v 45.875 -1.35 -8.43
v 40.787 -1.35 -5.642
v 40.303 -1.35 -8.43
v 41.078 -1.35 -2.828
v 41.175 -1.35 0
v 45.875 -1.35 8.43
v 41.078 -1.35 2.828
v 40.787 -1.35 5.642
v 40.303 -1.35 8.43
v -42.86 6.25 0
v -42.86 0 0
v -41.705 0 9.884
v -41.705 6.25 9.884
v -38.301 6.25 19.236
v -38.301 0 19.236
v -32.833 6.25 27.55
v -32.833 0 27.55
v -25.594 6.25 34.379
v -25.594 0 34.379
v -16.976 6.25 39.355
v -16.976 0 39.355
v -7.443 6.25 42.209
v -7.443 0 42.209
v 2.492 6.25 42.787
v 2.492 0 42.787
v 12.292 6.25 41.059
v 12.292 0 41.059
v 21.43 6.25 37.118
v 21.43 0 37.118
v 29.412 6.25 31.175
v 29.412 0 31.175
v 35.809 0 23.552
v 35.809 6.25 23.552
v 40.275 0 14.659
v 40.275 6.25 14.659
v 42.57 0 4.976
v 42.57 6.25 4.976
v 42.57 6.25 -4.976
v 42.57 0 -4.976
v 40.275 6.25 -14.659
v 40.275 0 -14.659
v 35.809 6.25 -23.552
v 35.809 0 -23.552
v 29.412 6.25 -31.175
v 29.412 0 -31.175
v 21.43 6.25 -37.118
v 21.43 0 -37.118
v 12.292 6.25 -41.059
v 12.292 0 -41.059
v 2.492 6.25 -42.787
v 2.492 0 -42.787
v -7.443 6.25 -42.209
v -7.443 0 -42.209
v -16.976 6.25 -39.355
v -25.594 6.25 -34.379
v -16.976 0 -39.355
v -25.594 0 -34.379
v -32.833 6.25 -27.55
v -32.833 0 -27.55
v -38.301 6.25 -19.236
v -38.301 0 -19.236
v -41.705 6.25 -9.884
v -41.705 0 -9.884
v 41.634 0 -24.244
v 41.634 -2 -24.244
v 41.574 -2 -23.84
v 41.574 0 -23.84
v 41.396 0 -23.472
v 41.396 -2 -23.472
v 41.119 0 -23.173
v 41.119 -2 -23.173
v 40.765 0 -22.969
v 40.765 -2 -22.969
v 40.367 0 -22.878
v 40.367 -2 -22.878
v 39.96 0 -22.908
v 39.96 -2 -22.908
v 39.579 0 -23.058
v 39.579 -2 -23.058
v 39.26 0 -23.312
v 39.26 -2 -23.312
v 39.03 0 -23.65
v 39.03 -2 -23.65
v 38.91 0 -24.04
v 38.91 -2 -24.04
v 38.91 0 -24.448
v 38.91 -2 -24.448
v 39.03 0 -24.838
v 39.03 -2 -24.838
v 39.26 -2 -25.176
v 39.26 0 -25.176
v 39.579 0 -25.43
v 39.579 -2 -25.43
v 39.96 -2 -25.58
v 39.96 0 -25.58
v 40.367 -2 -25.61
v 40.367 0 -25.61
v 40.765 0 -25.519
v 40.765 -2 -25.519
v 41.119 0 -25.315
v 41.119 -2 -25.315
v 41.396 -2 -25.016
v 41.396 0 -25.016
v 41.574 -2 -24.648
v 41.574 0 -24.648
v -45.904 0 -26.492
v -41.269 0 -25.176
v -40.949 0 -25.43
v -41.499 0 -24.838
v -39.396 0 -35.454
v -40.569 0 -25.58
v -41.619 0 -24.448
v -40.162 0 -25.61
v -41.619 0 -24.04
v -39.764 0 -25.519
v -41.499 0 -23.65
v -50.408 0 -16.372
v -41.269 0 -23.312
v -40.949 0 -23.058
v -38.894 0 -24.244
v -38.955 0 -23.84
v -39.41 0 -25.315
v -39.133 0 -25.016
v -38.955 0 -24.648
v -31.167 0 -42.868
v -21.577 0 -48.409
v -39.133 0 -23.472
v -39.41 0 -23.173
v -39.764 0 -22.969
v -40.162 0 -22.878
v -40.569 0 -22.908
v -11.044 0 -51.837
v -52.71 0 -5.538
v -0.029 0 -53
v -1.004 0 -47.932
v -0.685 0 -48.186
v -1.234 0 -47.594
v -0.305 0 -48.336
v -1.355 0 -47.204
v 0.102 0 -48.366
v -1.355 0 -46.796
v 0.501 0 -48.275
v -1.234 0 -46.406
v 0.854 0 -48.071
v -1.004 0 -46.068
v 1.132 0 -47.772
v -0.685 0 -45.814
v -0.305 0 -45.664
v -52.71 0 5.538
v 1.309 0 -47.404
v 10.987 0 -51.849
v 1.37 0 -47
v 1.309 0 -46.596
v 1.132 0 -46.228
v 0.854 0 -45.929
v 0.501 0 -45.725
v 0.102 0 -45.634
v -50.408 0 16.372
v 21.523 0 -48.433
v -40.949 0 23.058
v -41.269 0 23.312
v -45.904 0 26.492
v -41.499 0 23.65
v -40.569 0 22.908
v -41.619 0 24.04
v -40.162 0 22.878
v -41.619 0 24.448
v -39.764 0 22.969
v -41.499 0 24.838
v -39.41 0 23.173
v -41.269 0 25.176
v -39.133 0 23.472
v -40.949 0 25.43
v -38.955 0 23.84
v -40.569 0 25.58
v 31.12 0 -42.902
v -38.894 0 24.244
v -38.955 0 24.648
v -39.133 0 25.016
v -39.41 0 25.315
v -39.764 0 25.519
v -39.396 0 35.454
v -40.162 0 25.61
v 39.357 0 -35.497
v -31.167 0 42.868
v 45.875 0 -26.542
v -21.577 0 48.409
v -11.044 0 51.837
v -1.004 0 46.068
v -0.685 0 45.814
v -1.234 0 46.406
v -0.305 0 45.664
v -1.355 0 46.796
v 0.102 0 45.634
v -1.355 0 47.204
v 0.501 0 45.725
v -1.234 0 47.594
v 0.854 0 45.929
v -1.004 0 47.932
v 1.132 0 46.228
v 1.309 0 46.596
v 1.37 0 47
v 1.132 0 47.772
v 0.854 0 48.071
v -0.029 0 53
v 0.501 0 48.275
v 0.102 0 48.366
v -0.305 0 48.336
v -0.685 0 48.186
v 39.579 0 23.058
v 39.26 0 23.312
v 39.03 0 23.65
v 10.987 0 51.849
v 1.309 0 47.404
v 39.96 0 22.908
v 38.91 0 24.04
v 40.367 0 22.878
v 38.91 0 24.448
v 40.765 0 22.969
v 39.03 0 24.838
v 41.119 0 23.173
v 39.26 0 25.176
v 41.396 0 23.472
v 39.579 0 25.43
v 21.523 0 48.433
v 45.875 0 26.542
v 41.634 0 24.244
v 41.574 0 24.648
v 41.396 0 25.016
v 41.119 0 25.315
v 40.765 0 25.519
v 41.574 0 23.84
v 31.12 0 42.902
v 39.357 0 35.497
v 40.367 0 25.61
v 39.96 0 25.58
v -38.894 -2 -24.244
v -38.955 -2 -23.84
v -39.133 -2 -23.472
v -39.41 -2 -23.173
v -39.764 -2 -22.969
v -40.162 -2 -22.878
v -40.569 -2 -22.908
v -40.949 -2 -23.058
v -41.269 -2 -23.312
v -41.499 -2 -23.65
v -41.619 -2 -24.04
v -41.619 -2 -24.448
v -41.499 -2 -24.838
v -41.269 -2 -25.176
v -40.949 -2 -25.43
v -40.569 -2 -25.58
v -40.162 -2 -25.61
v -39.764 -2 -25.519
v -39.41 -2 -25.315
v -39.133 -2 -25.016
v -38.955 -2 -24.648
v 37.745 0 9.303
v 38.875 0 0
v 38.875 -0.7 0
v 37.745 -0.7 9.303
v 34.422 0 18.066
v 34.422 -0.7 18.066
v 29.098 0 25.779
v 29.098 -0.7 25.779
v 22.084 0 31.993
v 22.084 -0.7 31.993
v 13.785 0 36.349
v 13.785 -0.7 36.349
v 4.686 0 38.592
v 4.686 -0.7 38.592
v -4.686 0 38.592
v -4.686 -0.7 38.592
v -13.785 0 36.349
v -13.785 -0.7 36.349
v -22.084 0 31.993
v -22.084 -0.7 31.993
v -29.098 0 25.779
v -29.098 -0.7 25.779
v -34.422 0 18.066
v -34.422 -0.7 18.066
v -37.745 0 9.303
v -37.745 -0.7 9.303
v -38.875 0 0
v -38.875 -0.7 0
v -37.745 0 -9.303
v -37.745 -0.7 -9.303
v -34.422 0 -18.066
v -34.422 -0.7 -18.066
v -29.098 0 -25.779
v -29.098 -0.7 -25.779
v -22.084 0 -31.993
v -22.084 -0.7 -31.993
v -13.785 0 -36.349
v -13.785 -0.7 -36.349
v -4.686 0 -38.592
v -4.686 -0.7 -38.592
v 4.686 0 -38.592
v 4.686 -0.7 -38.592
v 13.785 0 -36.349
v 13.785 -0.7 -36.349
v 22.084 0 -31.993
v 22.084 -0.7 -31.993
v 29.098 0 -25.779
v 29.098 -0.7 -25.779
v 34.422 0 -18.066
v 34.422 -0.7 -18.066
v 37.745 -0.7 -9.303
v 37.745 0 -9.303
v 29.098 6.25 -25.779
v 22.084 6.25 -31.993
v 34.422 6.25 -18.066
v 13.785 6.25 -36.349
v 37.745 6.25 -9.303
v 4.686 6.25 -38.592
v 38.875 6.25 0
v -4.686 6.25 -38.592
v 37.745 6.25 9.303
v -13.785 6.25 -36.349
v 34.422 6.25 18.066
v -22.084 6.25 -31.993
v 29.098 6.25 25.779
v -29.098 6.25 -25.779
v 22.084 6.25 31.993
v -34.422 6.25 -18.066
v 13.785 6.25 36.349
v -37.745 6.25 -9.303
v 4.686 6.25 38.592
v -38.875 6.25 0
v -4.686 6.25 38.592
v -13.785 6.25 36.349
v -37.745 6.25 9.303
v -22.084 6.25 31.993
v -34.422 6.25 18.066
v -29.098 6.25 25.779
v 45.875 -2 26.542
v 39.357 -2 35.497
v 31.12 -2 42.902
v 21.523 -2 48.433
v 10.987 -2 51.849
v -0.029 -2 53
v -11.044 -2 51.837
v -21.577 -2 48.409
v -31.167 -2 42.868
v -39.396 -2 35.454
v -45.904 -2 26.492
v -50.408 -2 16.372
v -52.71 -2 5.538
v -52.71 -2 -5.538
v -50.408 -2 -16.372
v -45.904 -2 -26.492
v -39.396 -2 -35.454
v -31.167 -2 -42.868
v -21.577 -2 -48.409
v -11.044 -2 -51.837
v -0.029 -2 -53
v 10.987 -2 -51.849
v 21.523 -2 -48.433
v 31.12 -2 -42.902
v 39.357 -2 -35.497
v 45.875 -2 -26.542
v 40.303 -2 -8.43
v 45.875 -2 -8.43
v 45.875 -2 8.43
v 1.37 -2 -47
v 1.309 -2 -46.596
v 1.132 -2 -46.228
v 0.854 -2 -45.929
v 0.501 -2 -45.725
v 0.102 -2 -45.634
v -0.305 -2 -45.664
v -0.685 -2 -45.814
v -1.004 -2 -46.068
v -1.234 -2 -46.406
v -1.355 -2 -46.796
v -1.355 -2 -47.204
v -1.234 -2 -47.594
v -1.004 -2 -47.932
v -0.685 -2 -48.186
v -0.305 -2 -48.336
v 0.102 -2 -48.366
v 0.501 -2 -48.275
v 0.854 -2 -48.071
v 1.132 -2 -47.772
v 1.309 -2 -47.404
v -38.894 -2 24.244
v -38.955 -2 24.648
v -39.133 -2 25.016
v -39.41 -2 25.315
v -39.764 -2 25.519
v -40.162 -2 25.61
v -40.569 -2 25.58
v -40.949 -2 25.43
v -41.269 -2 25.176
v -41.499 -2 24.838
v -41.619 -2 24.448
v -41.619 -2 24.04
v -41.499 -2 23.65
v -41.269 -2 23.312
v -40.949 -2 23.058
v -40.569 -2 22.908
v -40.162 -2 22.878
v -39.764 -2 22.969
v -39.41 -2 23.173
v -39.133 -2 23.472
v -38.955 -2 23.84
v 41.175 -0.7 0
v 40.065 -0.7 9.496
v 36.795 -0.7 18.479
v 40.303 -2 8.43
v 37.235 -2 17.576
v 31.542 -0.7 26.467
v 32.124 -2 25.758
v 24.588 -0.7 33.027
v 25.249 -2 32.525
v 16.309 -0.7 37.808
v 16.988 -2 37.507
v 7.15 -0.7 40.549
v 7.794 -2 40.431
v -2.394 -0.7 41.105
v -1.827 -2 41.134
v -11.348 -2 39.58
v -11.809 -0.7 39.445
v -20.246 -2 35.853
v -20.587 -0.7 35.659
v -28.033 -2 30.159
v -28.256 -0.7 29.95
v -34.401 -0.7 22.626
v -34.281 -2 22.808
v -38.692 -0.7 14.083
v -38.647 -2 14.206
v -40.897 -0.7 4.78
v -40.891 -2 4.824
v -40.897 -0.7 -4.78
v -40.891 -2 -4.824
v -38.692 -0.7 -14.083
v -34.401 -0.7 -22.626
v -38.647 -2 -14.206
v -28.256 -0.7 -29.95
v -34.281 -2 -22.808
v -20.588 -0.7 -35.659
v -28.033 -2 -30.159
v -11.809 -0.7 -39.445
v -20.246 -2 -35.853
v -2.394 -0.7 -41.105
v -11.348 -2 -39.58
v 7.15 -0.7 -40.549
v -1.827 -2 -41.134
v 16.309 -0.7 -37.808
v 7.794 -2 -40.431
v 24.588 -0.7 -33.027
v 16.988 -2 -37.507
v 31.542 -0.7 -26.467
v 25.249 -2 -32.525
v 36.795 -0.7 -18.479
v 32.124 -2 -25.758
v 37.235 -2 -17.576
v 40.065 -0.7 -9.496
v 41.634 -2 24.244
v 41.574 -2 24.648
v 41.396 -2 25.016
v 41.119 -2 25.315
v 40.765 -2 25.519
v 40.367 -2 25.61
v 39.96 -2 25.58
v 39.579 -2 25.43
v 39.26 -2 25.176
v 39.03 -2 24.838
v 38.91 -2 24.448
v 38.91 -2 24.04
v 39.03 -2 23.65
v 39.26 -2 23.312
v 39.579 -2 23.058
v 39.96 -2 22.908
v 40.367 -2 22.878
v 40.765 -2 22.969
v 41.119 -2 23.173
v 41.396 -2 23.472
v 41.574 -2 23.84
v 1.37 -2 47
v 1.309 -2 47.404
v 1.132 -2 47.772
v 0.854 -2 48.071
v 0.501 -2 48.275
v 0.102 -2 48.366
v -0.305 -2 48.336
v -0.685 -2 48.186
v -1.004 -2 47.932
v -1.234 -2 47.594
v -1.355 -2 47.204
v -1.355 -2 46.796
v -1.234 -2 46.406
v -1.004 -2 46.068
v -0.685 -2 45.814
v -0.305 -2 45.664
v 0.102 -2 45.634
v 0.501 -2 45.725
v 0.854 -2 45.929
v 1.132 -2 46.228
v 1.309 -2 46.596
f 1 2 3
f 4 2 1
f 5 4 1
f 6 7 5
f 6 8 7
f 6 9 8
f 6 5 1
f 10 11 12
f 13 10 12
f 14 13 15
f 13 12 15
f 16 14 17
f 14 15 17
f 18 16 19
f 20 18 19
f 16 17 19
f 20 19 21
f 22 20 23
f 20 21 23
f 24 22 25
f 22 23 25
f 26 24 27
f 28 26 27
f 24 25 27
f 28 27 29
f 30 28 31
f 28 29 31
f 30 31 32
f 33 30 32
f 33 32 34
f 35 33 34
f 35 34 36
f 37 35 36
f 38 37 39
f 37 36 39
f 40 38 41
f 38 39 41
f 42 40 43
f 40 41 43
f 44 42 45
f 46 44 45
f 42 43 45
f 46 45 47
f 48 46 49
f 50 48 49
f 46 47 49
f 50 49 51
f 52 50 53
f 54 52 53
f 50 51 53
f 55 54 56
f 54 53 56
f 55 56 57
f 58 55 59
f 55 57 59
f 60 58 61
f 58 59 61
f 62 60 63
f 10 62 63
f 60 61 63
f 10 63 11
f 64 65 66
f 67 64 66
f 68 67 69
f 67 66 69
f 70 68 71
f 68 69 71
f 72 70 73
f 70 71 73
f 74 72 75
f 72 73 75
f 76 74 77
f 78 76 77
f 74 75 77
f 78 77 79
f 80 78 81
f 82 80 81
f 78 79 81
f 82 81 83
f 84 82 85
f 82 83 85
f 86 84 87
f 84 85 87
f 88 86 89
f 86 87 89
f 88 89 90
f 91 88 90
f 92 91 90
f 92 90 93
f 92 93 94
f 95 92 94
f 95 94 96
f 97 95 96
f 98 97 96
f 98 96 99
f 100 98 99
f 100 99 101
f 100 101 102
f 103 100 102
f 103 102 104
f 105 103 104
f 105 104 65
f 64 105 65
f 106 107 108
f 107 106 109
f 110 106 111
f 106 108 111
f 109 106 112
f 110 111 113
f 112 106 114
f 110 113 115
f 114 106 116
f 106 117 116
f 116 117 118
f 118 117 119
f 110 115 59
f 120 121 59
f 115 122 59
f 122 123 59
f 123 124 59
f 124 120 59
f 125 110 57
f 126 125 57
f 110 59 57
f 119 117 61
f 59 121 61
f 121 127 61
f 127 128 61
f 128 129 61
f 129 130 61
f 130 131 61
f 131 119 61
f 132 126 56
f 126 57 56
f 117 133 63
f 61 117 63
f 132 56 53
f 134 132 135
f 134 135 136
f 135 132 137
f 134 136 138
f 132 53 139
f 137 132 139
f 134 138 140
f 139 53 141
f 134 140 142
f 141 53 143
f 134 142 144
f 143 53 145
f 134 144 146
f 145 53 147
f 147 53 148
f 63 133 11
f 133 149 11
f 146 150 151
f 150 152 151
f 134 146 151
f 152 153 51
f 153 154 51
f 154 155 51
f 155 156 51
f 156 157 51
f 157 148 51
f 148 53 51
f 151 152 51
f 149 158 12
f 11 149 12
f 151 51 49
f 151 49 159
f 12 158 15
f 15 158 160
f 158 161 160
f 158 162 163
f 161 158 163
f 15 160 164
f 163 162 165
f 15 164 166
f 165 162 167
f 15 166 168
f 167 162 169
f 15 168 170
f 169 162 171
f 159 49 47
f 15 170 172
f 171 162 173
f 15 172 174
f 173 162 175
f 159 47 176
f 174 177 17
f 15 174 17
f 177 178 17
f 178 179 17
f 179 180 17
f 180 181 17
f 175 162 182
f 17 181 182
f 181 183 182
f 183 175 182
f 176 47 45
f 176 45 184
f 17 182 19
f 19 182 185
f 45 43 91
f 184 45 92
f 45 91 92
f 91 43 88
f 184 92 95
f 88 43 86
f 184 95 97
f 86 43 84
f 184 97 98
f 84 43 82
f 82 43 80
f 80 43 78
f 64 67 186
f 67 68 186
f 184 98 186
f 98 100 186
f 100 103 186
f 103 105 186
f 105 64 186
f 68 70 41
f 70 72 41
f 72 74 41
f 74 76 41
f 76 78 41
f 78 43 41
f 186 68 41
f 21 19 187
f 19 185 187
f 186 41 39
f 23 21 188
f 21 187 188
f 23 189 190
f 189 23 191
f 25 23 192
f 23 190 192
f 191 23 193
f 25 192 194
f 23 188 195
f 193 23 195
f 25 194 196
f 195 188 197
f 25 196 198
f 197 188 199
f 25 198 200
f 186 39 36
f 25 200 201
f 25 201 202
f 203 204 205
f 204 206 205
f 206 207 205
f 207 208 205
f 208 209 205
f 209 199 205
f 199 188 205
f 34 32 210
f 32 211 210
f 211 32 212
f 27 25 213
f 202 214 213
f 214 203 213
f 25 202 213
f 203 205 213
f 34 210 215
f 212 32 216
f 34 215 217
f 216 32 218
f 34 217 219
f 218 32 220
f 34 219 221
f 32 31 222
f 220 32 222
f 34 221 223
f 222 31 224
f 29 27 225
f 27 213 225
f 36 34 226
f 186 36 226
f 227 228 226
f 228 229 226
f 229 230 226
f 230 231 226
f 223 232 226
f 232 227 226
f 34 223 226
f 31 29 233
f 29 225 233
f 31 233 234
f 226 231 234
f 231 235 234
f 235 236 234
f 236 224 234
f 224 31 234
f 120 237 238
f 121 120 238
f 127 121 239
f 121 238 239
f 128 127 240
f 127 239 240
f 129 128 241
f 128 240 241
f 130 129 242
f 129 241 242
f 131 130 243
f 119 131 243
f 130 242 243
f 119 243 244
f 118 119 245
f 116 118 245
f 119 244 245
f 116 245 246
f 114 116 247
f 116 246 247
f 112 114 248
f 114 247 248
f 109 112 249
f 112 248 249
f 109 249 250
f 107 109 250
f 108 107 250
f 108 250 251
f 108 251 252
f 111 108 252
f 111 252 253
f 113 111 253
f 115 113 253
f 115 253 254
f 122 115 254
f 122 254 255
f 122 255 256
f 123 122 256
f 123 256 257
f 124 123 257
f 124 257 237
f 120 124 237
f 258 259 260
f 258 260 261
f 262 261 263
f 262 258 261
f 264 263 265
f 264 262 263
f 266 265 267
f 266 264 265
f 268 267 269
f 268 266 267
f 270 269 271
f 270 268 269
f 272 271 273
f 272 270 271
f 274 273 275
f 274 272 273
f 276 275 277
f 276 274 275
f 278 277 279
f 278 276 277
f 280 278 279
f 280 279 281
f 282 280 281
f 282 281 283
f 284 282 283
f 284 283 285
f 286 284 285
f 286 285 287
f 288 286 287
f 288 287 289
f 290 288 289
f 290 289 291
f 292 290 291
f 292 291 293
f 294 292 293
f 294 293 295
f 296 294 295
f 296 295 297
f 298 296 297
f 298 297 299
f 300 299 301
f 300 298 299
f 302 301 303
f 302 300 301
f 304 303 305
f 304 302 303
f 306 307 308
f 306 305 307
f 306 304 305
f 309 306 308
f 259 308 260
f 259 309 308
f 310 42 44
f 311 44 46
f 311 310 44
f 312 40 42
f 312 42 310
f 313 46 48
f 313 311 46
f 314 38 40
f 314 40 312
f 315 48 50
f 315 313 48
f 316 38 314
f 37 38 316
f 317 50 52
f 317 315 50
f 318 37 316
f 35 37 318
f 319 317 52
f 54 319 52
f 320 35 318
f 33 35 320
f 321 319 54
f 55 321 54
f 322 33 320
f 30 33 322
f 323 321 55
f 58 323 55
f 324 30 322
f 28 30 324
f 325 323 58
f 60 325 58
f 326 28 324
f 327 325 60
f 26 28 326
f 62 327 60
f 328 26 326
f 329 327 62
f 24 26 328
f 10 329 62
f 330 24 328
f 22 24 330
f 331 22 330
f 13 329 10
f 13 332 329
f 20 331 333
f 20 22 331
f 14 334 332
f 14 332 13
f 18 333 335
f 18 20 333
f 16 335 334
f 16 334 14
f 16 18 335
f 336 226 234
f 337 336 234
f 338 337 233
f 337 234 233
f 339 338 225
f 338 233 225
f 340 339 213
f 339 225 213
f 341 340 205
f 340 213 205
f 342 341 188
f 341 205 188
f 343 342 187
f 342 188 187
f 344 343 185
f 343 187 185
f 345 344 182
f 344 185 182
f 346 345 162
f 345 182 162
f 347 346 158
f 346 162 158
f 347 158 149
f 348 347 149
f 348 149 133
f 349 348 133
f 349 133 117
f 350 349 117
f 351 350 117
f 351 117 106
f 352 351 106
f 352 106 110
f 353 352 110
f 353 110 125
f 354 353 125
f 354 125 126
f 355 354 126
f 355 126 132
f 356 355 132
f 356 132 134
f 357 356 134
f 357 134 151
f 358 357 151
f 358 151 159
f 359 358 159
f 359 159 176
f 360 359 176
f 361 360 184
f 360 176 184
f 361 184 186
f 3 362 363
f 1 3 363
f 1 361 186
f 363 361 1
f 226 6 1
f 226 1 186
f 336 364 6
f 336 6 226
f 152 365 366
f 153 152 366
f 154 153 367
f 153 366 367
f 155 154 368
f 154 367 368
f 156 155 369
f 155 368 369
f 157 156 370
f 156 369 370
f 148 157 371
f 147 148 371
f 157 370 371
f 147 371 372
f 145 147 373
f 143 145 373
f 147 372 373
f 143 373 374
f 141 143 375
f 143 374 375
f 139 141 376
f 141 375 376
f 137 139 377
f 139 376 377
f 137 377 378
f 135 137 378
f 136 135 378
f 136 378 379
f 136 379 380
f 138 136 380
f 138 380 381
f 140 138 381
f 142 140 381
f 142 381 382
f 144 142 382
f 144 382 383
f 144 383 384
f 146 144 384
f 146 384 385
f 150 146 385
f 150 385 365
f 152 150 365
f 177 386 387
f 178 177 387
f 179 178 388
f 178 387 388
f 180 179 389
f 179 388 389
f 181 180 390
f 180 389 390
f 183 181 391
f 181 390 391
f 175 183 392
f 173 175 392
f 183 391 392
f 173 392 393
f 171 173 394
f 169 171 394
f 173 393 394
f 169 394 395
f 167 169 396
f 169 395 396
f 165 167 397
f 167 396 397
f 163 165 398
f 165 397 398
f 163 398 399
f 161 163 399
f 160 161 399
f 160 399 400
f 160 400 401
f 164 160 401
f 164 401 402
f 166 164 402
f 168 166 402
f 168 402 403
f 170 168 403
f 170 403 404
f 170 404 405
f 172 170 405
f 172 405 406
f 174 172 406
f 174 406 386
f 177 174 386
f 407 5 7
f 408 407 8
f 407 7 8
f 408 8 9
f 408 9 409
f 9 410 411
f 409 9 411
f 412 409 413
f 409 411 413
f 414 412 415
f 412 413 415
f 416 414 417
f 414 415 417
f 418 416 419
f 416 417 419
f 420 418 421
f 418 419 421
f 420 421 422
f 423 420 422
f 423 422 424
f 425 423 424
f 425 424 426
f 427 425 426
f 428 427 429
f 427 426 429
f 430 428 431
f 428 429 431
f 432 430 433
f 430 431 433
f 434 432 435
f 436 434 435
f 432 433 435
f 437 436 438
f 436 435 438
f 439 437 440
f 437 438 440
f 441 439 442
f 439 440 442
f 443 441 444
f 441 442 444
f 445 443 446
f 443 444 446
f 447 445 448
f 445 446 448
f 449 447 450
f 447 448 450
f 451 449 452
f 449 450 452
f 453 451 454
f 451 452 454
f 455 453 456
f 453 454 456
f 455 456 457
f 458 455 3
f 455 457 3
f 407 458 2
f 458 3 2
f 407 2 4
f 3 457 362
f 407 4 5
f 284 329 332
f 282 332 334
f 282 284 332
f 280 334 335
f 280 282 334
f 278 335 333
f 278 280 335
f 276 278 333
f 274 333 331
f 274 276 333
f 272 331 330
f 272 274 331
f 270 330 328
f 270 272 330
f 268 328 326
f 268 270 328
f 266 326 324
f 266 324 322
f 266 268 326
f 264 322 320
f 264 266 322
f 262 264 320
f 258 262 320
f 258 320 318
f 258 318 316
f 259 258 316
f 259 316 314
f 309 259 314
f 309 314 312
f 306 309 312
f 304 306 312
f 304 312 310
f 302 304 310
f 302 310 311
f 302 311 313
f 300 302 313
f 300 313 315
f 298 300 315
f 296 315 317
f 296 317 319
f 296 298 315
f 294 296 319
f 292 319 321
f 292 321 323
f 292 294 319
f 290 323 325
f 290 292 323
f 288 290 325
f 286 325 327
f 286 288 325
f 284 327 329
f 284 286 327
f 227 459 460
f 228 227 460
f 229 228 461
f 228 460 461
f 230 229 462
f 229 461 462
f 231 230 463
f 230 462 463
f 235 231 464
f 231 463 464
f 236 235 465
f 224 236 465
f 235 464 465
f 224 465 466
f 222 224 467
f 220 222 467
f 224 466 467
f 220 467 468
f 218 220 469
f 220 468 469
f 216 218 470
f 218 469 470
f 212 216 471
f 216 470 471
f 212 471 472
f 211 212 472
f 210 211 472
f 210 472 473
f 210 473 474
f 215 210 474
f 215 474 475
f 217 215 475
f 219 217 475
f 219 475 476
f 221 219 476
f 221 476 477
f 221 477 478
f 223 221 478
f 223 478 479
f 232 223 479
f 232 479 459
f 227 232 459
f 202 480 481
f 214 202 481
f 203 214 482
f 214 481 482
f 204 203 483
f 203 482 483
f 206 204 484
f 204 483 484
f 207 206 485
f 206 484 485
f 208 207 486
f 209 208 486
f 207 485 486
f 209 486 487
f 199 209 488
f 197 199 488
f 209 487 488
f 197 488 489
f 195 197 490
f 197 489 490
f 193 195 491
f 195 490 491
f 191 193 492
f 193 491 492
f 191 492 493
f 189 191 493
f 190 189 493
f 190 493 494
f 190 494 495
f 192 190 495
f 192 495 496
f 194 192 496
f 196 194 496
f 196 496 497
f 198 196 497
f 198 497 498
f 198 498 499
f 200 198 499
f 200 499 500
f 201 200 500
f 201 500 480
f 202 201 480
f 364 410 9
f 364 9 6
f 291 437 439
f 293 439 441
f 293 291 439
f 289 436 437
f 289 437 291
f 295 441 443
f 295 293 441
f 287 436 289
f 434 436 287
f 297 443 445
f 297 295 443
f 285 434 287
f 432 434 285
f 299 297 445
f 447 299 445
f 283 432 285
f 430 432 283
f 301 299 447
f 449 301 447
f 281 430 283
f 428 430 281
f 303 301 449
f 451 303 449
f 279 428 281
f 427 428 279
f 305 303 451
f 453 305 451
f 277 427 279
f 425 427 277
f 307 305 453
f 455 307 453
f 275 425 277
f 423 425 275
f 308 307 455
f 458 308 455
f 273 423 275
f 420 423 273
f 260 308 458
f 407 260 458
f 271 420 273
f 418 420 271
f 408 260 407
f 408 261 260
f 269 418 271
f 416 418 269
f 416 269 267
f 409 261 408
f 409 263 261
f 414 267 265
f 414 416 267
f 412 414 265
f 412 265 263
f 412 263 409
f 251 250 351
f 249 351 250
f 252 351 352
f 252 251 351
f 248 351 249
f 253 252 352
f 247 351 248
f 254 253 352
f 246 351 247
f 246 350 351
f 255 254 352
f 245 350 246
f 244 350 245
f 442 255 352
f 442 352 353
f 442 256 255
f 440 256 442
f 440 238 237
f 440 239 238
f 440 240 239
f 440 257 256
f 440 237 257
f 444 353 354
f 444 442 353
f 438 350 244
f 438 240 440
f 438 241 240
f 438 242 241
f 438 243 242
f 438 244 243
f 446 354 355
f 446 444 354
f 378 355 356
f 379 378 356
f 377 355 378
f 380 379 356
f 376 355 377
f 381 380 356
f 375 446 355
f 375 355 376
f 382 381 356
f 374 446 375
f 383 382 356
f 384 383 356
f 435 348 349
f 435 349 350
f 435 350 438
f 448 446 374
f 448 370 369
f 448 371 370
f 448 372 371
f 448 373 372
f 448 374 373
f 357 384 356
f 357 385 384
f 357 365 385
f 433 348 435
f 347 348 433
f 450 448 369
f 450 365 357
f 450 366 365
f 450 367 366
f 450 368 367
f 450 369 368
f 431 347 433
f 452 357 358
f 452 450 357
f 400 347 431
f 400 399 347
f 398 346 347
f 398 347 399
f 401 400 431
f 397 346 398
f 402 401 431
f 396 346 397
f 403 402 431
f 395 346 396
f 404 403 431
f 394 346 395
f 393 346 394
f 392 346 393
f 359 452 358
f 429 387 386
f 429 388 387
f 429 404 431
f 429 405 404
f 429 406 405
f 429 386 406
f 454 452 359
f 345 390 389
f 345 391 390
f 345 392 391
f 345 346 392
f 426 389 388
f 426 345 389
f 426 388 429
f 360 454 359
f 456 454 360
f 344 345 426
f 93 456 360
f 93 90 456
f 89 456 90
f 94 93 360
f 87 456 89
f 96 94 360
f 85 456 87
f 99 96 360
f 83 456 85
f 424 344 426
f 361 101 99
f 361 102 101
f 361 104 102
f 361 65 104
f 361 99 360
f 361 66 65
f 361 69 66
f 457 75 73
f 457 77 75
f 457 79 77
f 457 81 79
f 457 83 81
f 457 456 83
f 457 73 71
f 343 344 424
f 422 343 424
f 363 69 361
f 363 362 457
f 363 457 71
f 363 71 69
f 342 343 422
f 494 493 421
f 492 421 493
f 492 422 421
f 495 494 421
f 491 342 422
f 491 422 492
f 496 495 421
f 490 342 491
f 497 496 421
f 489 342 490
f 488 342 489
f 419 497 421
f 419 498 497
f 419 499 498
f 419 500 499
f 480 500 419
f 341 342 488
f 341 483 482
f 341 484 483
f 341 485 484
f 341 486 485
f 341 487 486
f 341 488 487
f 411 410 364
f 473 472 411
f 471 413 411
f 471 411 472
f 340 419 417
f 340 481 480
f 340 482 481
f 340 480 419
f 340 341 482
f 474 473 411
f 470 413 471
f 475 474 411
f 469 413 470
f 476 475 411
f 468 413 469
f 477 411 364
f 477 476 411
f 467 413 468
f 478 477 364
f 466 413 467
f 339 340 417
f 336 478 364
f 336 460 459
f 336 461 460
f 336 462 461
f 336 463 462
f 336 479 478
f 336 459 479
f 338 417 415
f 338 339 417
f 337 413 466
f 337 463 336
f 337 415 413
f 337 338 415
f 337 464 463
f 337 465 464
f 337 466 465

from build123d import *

# Parameters (mm, degrees)
F0_R      = 53
F0_R_2    = 38.875
F1_DEPTH  = 2
F2_W      = 15.987269
F2_H      = 100
F3_DEPTH  = 25
F4_R      = 41.175
F5_DEPTH  = 1.3
F6_R      = 42.86
F6_R_2    = 38.875
F7_DEPTH  = 6.25
F8_R      = 1.37
F9_DEPTH  = 25
F10_W     = 16.146997
F10_H     = 16.86
F11_DEPTH = 0.65


with BuildPart() as f1:
    # F0 (on Front) → F1 (new body)
    with BuildSketch(Plane.XZ):
        Circle(F0_R)
        Circle(F0_R_2, mode=Mode.SUBTRACT)
    extrude(amount=F1_DEPTH)

    # F2 (on face) → F3 (cut)
    with BuildSketch(Plane.XZ.offset(2)):
        with Locations((53.868634, 20.202986)):
            Rectangle(F2_W, F2_H)
    extrude(amount=-F3_DEPTH, mode=Mode.SUBTRACT)

    # F4 (on face) → F5 (cut)
    with BuildSketch(Plane.XZ.offset(2)):
        Circle(F4_R)
    extrude(amount=-F5_DEPTH, mode=Mode.SUBTRACT)

    # F6 (on face) → F7 (join)
    with BuildSketch(Plane(origin=(0, 0, 0), x_dir=(-1, 0, 0), z_dir=(0, 1, 0))):
        Circle(F6_R)
        Circle(F6_R_2, mode=Mode.SUBTRACT)
    extrude(amount=F7_DEPTH)

    # F8 (on face) → F9 (cut)
    with BuildSketch(Plane.XZ.offset(2)):
        with Locations((0, 47)):
            Circle(F8_R)
        with Locations((0, -47)):
            Circle(F8_R)
        with Locations((40.264472, 24.244016)):
            Circle(F8_R)
        with Locations((-40.264472, 24.244016)):
            Circle(F8_R)
        with Locations((-40.264472, -24.244016)):
            Circle(F8_R)
        with Locations((40.264472, -24.244016)):
            Circle(F8_R)
    extrude(amount=-F9_DEPTH, mode=Mode.SUBTRACT)

    # F10 (on face) → F11 (cut)
    with BuildSketch(Plane.XZ.offset(2)):
        with Locations((43.073498, 0)):
            Rectangle(F10_W, F10_H)
    extrude(amount=-F11_DEPTH, mode=Mode.SUBTRACT)


solid = f1.part
